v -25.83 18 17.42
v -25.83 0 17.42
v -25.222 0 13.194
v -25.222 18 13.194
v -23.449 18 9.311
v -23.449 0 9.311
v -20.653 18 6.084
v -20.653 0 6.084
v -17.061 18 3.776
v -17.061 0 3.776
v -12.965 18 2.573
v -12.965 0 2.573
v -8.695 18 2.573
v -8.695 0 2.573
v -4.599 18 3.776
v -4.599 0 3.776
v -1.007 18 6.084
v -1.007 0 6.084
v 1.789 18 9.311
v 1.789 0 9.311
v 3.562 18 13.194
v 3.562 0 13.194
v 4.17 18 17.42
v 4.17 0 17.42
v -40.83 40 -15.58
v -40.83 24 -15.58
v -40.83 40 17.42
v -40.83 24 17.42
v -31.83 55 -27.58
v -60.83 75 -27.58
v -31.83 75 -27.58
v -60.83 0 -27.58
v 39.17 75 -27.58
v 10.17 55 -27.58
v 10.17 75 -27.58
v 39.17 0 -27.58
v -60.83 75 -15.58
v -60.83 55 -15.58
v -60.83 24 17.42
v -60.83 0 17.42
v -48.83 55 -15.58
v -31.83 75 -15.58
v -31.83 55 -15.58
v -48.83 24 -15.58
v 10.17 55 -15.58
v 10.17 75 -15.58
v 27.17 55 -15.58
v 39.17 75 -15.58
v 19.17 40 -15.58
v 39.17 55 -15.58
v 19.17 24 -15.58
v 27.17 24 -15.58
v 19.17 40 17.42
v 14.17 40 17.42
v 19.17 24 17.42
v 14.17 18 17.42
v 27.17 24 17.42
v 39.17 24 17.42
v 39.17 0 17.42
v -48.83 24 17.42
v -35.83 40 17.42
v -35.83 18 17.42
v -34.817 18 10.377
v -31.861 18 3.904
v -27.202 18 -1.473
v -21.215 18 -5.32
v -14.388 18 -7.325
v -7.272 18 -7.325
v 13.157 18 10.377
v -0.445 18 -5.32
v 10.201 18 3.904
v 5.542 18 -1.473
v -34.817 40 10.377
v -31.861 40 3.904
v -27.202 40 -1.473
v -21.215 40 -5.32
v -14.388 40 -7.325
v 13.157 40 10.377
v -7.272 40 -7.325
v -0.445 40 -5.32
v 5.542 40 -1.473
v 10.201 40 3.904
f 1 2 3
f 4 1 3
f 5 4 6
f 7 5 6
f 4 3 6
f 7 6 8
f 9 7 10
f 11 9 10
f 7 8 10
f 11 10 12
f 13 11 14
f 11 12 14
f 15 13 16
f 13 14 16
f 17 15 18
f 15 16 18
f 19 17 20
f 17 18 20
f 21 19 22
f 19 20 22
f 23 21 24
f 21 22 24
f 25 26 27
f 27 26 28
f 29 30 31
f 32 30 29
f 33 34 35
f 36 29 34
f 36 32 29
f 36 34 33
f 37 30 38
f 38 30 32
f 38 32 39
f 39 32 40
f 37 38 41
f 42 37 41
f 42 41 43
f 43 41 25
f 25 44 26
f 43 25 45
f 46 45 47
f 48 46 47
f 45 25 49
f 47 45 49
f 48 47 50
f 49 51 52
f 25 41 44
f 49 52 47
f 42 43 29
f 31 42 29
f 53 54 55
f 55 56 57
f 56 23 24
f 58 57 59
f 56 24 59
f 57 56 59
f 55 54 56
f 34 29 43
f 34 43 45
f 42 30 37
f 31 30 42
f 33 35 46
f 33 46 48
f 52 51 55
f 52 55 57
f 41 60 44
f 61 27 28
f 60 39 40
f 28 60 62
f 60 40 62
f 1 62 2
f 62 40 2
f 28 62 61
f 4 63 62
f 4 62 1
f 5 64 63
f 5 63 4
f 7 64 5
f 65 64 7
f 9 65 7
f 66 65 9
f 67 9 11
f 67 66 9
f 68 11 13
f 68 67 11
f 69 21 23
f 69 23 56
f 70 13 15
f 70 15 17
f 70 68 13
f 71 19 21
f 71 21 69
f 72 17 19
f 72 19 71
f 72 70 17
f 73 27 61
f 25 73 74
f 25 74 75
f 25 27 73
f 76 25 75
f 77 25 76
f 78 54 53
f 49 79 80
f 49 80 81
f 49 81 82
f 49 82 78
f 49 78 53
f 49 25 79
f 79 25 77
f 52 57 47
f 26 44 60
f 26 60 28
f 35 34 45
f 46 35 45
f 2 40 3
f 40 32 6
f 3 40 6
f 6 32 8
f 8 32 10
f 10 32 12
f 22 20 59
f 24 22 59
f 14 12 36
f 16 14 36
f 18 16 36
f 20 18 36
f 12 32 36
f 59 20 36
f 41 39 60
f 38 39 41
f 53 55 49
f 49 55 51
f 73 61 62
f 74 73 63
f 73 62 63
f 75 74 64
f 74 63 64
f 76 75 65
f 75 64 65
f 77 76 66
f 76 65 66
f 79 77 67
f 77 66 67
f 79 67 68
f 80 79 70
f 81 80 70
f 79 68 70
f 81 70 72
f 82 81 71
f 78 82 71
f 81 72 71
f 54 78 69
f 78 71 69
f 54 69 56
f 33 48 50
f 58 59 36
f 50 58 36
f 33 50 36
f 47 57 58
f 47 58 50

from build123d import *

# Parameters (mm, degrees)
BOSS_EXTRUDE3_DEPTH   = 18
SKETCH1_7_W           = 8
SKETCH1_7_H           = 33
BOSS_EXTRUDE4_DEPTH   = 24
BOSS_EXTRUDE4_2_DEPTH = 24
SKETCH1_8_W           = 12
SKETCH1_8_H           = 33
BOSS_EXTRUDE5_DEPTH   = 55
CUT_EXTRUDE1_DEPTH    = 1000
SKETCH1_9_W           = 29
SKETCH1_9_H           = 12
BOSS_EXTRUDE6_DEPTH   = 75
SKETCH1_10_W          = 42
SKETCH1_10_H          = 12
BOSS_EXTRUDE7_DEPTH   = 55
BOSS_EXTRUDE8_DEPTH   = 40


with BuildPart() as part:
    # Sketch1 → Boss-Extrude3 (new body)
    with BuildSketch(Plane(origin=(0, 0, 0), x_dir=(1, 0, 0), z_dir=(0, 1, 0))):
        with BuildLine():
            ThreePointArc((14.170014239, -17.420303066), (-10.829985761, 7.579696934), (-35.829985761, -17.420303066))
            Line((-35.829985761, -17.420303066), (-25.829985761, -17.420303066))
            ThreePointArc((-25.829985761, -17.420303066), (-10.829985761, -2.420303066), (4.170014239, -17.420303066))
            Line((4.170014239, -17.420303066), (14.170014239, -17.420303066))
        make_face()
    extrude(amount=BOSS_EXTRUDE3_DEPTH)



with BuildPart() as body_2:
    # Sketch1<7> → Boss-Extrude4 (new body)
    with BuildSketch(Plane(origin=(0, 0, 0), x_dir=(1, 0, 0), z_dir=(0, 1, 0))):
        with Locations((-44.829985761, -0.920303066)):
            Rectangle(SKETCH1_7_W, SKETCH1_7_H)
    extrude(amount=BOSS_EXTRUDE4_DEPTH)



with BuildPart() as body_3:
    # Sketch1<7> → Boss-Extrude4 2 (new body)
    with BuildSketch(Plane(origin=(0, 0, 0), x_dir=(1, 0, 0), z_dir=(0, 1, 0))):
        with Locations((23.170014239, -0.920303066)):
            Rectangle(SKETCH1_7_W, SKETCH1_7_H)
    extrude(amount=BOSS_EXTRUDE4_2_DEPTH)


with BuildPart() as body_2_1:
    add(body_2.part)

    add(body_3.part)  # Boss-Extrude5 merges body 3
    # Sketch1<8> → Boss-Extrude5 (add)
    with BuildSketch(Plane(origin=(0, 0, 0), x_dir=(1, 0, 0), z_dir=(0, 1, 0))):
        with Locations((-54.829985761, -0.920303066)):
            Rectangle(SKETCH1_8_W, SKETCH1_8_H)
        with Locations((33.170014239, -0.920303066)):
            Rectangle(SKETCH1_8_W, SKETCH1_8_H)
    extrude(amount=BOSS_EXTRUDE5_DEPTH)

    # Sketch2 → Cut-Extrude1 (cut)
    with BuildSketch(Plane.ZY.offset(60.829985761)):
        Polygon((17.420303066, 55), (17.420303066, 24), (-15.579696934, 55), align=None)
    extrude(amount=-CUT_EXTRUDE1_DEPTH, mode=Mode.SUBTRACT)

    # Sketch1<9> → Boss-Extrude6 (add)
    with BuildSketch(Plane(origin=(0, 0, 0), x_dir=(1, 0, 0), z_dir=(0, 1, 0))):
        with Locations((-46.329985761, 21.579696934)):
            Rectangle(SKETCH1_9_W, SKETCH1_9_H)
        with Locations((24.670014239, 21.579696934)):
            Rectangle(SKETCH1_9_W, SKETCH1_9_H)
    extrude(amount=BOSS_EXTRUDE6_DEPTH)

    # Sketch1<10> → Boss-Extrude7 (add)
    with BuildSketch(Plane(origin=(0, 0, 0), x_dir=(1, 0, 0), z_dir=(0, 1, 0))):
        with Locations((-10.829985761, 21.579696934)):
            Rectangle(SKETCH1_10_W, SKETCH1_10_H)
    extrude(amount=BOSS_EXTRUDE7_DEPTH)


with BuildPart() as part_1:
    add(part.part)

    add(body_2_1.part)  # Boss-Extrude8 merges body 2
    # Sketch1<11> → Boss-Extrude8 (add)
    with BuildSketch(Plane(origin=(0, 0, 0), x_dir=(1, 0, 0), z_dir=(0, 1, 0))):
        with BuildLine():
            Line((-40.829985761, 15.579696934), (-40.829985761, -17.420303066))
            Line((-40.829985761, -17.420303066), (-35.829985761, -17.420303066))
            ThreePointArc((-35.829985761, -17.420303066), (-10.829985761, 7.579696934), (14.170014239, -17.420303066))
            Line((14.170014239, -17.420303066), (19.170014239, -17.420303066))
            Line((19.170014239, -17.420303066), (19.170014239, 15.579696934))
            Line((19.170014239, 15.579696934), (10.170014239, 15.579696934))
            Line((10.170014239, 15.579696934), (-31.829985761, 15.579696934))
            Line((-31.829985761, 15.579696934), (-40.829985761, 15.579696934))
        make_face()
    extrude(amount=BOSS_EXTRUDE8_DEPTH)


solid = part_1.part
